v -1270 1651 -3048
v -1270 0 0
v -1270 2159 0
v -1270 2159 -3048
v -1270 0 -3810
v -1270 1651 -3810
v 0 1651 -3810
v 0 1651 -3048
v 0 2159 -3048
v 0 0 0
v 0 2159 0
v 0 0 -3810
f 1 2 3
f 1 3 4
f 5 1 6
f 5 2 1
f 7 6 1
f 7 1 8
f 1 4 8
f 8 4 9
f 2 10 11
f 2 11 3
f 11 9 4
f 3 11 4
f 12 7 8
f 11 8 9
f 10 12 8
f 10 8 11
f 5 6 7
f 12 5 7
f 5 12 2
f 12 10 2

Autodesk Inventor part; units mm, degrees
ref_plane "YZ Plane" through (0, 0, 0) normal (1, 0, 0) x (0, 1, 0)
ref_plane "XZ Plane" through (0, 0, 0) normal (0, 1, 0) x (-1, 0, 0)
ref_plane "XY Plane" through (0, 0, 0) normal (0, 0, 1) x (1, 0, 0)
sketch "Sketch1" plane through (0, 0, 0) normal (0, 1, 0) x (-1, 0, 0)
  line L0 (0, 0) -> (1270, 0)
  line L1 (1270, 0) -> (1270, -3810)
  line L2 (1270, -3810) -> (0, -3810)
  line L3 (0, -3810) -> (0, 0)
  dimension "d0" = 3810
  dimension "d1" = 1270
extrude "Extrusion1" add sketch "Sketch1" along normal blind 2159
sketch "Sketch2" plane through (0, 2159, 0) normal (0, 1, 0) x (1, 0, 0)
  line L0 (0, 0) -> (0, 3810) projected
  line L1 (0, 3810) -> (-1270, 3810) projected
  line L2 (-1270, 3810) -> (-1270, 0) projected
  line L3 (-1270, 3048) -> (0, 3048)
  dimension "d5" = 762
extrude "Extrusion2" cut sketch "Sketch2" against normal blind 508
properties part number "CNC"
